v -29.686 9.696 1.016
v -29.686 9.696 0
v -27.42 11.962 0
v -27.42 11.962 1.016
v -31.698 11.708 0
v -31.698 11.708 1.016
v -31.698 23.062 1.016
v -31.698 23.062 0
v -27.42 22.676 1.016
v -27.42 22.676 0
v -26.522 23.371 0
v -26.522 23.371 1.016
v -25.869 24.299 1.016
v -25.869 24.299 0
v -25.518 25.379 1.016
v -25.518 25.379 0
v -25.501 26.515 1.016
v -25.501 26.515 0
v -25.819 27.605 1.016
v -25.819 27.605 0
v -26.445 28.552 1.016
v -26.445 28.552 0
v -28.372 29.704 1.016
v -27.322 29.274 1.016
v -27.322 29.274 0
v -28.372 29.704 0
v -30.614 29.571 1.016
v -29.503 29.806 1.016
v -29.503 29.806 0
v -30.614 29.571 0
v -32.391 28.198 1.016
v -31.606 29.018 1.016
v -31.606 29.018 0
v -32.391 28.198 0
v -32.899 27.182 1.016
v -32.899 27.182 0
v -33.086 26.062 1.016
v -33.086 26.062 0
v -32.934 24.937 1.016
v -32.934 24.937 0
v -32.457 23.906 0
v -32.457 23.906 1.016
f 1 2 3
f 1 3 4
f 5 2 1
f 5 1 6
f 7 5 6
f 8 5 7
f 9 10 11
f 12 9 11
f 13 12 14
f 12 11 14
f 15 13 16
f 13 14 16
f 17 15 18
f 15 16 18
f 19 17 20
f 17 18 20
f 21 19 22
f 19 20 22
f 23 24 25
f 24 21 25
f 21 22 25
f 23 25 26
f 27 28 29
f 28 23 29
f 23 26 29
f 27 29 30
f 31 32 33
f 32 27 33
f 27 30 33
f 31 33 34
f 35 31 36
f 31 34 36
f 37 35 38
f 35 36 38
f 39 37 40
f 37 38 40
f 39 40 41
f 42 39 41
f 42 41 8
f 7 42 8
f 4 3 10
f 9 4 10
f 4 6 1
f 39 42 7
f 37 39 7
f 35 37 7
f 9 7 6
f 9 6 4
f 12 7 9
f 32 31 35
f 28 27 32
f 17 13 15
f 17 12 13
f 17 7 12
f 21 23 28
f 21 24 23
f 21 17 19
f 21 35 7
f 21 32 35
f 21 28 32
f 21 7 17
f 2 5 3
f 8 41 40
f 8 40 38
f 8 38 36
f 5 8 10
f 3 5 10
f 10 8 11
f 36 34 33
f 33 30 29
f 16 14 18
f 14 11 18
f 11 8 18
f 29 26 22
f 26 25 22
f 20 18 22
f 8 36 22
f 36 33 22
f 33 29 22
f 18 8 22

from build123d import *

# Parameters (mm, degrees)
F0_R        = 3.81
F1_DEPTH    = 1.016
F2_W        = 4.2779184878
F2_H        = 13.4340701625
F3_DEPTH    = 1.016
F4_SIZE     = 2.286
F5_T1_DEPTH = 11.4673196631


# Not quite as in the source:
# - a fillet or chamfer that OpenCascade refuses, or shapes differently, is made with other operations: its cross-section is extruded or revolved along the edge and cut away or added


with BuildPart() as f1:
    # F0 (on Top) → F1 (new body)
    with BuildSketch(Plane.XY):
        with Locations((-29.276387766, 26.0032489896)):
            Circle(F0_R)
    extrude(amount=F1_DEPTH)

    # F2 (on Top) → F3 (join)
    with BuildSketch(Plane.XY):
        with Locations((-29.5591074973, 16.392851714)):
            Rectangle(F2_W, F2_H)
    extrude(amount=F3_DEPTH)

    # F4
    f4_edges = [f1.edges().sort_by_distance(p)[0] for p in [
        (-27.420148, 9.675817, 0.508),
    ]]
    chamfer(f4_edges, length=F4_SIZE)

    # F5: chamfer of 2.032 on 1 edges, made by hand

    # F5_s2 → F5_t1 (cut)
    with BuildSketch(Plane.XY.offset(-5.2256598315)):
        Polygon((-29.6660667412, 9.6758166328), (-31.6980667412, 11.7078166328), (-31.6980667412, 9.6758166328), align=None)
    extrude(amount=F5_T1_DEPTH, mode=Mode.SUBTRACT)


solid = f1.part
